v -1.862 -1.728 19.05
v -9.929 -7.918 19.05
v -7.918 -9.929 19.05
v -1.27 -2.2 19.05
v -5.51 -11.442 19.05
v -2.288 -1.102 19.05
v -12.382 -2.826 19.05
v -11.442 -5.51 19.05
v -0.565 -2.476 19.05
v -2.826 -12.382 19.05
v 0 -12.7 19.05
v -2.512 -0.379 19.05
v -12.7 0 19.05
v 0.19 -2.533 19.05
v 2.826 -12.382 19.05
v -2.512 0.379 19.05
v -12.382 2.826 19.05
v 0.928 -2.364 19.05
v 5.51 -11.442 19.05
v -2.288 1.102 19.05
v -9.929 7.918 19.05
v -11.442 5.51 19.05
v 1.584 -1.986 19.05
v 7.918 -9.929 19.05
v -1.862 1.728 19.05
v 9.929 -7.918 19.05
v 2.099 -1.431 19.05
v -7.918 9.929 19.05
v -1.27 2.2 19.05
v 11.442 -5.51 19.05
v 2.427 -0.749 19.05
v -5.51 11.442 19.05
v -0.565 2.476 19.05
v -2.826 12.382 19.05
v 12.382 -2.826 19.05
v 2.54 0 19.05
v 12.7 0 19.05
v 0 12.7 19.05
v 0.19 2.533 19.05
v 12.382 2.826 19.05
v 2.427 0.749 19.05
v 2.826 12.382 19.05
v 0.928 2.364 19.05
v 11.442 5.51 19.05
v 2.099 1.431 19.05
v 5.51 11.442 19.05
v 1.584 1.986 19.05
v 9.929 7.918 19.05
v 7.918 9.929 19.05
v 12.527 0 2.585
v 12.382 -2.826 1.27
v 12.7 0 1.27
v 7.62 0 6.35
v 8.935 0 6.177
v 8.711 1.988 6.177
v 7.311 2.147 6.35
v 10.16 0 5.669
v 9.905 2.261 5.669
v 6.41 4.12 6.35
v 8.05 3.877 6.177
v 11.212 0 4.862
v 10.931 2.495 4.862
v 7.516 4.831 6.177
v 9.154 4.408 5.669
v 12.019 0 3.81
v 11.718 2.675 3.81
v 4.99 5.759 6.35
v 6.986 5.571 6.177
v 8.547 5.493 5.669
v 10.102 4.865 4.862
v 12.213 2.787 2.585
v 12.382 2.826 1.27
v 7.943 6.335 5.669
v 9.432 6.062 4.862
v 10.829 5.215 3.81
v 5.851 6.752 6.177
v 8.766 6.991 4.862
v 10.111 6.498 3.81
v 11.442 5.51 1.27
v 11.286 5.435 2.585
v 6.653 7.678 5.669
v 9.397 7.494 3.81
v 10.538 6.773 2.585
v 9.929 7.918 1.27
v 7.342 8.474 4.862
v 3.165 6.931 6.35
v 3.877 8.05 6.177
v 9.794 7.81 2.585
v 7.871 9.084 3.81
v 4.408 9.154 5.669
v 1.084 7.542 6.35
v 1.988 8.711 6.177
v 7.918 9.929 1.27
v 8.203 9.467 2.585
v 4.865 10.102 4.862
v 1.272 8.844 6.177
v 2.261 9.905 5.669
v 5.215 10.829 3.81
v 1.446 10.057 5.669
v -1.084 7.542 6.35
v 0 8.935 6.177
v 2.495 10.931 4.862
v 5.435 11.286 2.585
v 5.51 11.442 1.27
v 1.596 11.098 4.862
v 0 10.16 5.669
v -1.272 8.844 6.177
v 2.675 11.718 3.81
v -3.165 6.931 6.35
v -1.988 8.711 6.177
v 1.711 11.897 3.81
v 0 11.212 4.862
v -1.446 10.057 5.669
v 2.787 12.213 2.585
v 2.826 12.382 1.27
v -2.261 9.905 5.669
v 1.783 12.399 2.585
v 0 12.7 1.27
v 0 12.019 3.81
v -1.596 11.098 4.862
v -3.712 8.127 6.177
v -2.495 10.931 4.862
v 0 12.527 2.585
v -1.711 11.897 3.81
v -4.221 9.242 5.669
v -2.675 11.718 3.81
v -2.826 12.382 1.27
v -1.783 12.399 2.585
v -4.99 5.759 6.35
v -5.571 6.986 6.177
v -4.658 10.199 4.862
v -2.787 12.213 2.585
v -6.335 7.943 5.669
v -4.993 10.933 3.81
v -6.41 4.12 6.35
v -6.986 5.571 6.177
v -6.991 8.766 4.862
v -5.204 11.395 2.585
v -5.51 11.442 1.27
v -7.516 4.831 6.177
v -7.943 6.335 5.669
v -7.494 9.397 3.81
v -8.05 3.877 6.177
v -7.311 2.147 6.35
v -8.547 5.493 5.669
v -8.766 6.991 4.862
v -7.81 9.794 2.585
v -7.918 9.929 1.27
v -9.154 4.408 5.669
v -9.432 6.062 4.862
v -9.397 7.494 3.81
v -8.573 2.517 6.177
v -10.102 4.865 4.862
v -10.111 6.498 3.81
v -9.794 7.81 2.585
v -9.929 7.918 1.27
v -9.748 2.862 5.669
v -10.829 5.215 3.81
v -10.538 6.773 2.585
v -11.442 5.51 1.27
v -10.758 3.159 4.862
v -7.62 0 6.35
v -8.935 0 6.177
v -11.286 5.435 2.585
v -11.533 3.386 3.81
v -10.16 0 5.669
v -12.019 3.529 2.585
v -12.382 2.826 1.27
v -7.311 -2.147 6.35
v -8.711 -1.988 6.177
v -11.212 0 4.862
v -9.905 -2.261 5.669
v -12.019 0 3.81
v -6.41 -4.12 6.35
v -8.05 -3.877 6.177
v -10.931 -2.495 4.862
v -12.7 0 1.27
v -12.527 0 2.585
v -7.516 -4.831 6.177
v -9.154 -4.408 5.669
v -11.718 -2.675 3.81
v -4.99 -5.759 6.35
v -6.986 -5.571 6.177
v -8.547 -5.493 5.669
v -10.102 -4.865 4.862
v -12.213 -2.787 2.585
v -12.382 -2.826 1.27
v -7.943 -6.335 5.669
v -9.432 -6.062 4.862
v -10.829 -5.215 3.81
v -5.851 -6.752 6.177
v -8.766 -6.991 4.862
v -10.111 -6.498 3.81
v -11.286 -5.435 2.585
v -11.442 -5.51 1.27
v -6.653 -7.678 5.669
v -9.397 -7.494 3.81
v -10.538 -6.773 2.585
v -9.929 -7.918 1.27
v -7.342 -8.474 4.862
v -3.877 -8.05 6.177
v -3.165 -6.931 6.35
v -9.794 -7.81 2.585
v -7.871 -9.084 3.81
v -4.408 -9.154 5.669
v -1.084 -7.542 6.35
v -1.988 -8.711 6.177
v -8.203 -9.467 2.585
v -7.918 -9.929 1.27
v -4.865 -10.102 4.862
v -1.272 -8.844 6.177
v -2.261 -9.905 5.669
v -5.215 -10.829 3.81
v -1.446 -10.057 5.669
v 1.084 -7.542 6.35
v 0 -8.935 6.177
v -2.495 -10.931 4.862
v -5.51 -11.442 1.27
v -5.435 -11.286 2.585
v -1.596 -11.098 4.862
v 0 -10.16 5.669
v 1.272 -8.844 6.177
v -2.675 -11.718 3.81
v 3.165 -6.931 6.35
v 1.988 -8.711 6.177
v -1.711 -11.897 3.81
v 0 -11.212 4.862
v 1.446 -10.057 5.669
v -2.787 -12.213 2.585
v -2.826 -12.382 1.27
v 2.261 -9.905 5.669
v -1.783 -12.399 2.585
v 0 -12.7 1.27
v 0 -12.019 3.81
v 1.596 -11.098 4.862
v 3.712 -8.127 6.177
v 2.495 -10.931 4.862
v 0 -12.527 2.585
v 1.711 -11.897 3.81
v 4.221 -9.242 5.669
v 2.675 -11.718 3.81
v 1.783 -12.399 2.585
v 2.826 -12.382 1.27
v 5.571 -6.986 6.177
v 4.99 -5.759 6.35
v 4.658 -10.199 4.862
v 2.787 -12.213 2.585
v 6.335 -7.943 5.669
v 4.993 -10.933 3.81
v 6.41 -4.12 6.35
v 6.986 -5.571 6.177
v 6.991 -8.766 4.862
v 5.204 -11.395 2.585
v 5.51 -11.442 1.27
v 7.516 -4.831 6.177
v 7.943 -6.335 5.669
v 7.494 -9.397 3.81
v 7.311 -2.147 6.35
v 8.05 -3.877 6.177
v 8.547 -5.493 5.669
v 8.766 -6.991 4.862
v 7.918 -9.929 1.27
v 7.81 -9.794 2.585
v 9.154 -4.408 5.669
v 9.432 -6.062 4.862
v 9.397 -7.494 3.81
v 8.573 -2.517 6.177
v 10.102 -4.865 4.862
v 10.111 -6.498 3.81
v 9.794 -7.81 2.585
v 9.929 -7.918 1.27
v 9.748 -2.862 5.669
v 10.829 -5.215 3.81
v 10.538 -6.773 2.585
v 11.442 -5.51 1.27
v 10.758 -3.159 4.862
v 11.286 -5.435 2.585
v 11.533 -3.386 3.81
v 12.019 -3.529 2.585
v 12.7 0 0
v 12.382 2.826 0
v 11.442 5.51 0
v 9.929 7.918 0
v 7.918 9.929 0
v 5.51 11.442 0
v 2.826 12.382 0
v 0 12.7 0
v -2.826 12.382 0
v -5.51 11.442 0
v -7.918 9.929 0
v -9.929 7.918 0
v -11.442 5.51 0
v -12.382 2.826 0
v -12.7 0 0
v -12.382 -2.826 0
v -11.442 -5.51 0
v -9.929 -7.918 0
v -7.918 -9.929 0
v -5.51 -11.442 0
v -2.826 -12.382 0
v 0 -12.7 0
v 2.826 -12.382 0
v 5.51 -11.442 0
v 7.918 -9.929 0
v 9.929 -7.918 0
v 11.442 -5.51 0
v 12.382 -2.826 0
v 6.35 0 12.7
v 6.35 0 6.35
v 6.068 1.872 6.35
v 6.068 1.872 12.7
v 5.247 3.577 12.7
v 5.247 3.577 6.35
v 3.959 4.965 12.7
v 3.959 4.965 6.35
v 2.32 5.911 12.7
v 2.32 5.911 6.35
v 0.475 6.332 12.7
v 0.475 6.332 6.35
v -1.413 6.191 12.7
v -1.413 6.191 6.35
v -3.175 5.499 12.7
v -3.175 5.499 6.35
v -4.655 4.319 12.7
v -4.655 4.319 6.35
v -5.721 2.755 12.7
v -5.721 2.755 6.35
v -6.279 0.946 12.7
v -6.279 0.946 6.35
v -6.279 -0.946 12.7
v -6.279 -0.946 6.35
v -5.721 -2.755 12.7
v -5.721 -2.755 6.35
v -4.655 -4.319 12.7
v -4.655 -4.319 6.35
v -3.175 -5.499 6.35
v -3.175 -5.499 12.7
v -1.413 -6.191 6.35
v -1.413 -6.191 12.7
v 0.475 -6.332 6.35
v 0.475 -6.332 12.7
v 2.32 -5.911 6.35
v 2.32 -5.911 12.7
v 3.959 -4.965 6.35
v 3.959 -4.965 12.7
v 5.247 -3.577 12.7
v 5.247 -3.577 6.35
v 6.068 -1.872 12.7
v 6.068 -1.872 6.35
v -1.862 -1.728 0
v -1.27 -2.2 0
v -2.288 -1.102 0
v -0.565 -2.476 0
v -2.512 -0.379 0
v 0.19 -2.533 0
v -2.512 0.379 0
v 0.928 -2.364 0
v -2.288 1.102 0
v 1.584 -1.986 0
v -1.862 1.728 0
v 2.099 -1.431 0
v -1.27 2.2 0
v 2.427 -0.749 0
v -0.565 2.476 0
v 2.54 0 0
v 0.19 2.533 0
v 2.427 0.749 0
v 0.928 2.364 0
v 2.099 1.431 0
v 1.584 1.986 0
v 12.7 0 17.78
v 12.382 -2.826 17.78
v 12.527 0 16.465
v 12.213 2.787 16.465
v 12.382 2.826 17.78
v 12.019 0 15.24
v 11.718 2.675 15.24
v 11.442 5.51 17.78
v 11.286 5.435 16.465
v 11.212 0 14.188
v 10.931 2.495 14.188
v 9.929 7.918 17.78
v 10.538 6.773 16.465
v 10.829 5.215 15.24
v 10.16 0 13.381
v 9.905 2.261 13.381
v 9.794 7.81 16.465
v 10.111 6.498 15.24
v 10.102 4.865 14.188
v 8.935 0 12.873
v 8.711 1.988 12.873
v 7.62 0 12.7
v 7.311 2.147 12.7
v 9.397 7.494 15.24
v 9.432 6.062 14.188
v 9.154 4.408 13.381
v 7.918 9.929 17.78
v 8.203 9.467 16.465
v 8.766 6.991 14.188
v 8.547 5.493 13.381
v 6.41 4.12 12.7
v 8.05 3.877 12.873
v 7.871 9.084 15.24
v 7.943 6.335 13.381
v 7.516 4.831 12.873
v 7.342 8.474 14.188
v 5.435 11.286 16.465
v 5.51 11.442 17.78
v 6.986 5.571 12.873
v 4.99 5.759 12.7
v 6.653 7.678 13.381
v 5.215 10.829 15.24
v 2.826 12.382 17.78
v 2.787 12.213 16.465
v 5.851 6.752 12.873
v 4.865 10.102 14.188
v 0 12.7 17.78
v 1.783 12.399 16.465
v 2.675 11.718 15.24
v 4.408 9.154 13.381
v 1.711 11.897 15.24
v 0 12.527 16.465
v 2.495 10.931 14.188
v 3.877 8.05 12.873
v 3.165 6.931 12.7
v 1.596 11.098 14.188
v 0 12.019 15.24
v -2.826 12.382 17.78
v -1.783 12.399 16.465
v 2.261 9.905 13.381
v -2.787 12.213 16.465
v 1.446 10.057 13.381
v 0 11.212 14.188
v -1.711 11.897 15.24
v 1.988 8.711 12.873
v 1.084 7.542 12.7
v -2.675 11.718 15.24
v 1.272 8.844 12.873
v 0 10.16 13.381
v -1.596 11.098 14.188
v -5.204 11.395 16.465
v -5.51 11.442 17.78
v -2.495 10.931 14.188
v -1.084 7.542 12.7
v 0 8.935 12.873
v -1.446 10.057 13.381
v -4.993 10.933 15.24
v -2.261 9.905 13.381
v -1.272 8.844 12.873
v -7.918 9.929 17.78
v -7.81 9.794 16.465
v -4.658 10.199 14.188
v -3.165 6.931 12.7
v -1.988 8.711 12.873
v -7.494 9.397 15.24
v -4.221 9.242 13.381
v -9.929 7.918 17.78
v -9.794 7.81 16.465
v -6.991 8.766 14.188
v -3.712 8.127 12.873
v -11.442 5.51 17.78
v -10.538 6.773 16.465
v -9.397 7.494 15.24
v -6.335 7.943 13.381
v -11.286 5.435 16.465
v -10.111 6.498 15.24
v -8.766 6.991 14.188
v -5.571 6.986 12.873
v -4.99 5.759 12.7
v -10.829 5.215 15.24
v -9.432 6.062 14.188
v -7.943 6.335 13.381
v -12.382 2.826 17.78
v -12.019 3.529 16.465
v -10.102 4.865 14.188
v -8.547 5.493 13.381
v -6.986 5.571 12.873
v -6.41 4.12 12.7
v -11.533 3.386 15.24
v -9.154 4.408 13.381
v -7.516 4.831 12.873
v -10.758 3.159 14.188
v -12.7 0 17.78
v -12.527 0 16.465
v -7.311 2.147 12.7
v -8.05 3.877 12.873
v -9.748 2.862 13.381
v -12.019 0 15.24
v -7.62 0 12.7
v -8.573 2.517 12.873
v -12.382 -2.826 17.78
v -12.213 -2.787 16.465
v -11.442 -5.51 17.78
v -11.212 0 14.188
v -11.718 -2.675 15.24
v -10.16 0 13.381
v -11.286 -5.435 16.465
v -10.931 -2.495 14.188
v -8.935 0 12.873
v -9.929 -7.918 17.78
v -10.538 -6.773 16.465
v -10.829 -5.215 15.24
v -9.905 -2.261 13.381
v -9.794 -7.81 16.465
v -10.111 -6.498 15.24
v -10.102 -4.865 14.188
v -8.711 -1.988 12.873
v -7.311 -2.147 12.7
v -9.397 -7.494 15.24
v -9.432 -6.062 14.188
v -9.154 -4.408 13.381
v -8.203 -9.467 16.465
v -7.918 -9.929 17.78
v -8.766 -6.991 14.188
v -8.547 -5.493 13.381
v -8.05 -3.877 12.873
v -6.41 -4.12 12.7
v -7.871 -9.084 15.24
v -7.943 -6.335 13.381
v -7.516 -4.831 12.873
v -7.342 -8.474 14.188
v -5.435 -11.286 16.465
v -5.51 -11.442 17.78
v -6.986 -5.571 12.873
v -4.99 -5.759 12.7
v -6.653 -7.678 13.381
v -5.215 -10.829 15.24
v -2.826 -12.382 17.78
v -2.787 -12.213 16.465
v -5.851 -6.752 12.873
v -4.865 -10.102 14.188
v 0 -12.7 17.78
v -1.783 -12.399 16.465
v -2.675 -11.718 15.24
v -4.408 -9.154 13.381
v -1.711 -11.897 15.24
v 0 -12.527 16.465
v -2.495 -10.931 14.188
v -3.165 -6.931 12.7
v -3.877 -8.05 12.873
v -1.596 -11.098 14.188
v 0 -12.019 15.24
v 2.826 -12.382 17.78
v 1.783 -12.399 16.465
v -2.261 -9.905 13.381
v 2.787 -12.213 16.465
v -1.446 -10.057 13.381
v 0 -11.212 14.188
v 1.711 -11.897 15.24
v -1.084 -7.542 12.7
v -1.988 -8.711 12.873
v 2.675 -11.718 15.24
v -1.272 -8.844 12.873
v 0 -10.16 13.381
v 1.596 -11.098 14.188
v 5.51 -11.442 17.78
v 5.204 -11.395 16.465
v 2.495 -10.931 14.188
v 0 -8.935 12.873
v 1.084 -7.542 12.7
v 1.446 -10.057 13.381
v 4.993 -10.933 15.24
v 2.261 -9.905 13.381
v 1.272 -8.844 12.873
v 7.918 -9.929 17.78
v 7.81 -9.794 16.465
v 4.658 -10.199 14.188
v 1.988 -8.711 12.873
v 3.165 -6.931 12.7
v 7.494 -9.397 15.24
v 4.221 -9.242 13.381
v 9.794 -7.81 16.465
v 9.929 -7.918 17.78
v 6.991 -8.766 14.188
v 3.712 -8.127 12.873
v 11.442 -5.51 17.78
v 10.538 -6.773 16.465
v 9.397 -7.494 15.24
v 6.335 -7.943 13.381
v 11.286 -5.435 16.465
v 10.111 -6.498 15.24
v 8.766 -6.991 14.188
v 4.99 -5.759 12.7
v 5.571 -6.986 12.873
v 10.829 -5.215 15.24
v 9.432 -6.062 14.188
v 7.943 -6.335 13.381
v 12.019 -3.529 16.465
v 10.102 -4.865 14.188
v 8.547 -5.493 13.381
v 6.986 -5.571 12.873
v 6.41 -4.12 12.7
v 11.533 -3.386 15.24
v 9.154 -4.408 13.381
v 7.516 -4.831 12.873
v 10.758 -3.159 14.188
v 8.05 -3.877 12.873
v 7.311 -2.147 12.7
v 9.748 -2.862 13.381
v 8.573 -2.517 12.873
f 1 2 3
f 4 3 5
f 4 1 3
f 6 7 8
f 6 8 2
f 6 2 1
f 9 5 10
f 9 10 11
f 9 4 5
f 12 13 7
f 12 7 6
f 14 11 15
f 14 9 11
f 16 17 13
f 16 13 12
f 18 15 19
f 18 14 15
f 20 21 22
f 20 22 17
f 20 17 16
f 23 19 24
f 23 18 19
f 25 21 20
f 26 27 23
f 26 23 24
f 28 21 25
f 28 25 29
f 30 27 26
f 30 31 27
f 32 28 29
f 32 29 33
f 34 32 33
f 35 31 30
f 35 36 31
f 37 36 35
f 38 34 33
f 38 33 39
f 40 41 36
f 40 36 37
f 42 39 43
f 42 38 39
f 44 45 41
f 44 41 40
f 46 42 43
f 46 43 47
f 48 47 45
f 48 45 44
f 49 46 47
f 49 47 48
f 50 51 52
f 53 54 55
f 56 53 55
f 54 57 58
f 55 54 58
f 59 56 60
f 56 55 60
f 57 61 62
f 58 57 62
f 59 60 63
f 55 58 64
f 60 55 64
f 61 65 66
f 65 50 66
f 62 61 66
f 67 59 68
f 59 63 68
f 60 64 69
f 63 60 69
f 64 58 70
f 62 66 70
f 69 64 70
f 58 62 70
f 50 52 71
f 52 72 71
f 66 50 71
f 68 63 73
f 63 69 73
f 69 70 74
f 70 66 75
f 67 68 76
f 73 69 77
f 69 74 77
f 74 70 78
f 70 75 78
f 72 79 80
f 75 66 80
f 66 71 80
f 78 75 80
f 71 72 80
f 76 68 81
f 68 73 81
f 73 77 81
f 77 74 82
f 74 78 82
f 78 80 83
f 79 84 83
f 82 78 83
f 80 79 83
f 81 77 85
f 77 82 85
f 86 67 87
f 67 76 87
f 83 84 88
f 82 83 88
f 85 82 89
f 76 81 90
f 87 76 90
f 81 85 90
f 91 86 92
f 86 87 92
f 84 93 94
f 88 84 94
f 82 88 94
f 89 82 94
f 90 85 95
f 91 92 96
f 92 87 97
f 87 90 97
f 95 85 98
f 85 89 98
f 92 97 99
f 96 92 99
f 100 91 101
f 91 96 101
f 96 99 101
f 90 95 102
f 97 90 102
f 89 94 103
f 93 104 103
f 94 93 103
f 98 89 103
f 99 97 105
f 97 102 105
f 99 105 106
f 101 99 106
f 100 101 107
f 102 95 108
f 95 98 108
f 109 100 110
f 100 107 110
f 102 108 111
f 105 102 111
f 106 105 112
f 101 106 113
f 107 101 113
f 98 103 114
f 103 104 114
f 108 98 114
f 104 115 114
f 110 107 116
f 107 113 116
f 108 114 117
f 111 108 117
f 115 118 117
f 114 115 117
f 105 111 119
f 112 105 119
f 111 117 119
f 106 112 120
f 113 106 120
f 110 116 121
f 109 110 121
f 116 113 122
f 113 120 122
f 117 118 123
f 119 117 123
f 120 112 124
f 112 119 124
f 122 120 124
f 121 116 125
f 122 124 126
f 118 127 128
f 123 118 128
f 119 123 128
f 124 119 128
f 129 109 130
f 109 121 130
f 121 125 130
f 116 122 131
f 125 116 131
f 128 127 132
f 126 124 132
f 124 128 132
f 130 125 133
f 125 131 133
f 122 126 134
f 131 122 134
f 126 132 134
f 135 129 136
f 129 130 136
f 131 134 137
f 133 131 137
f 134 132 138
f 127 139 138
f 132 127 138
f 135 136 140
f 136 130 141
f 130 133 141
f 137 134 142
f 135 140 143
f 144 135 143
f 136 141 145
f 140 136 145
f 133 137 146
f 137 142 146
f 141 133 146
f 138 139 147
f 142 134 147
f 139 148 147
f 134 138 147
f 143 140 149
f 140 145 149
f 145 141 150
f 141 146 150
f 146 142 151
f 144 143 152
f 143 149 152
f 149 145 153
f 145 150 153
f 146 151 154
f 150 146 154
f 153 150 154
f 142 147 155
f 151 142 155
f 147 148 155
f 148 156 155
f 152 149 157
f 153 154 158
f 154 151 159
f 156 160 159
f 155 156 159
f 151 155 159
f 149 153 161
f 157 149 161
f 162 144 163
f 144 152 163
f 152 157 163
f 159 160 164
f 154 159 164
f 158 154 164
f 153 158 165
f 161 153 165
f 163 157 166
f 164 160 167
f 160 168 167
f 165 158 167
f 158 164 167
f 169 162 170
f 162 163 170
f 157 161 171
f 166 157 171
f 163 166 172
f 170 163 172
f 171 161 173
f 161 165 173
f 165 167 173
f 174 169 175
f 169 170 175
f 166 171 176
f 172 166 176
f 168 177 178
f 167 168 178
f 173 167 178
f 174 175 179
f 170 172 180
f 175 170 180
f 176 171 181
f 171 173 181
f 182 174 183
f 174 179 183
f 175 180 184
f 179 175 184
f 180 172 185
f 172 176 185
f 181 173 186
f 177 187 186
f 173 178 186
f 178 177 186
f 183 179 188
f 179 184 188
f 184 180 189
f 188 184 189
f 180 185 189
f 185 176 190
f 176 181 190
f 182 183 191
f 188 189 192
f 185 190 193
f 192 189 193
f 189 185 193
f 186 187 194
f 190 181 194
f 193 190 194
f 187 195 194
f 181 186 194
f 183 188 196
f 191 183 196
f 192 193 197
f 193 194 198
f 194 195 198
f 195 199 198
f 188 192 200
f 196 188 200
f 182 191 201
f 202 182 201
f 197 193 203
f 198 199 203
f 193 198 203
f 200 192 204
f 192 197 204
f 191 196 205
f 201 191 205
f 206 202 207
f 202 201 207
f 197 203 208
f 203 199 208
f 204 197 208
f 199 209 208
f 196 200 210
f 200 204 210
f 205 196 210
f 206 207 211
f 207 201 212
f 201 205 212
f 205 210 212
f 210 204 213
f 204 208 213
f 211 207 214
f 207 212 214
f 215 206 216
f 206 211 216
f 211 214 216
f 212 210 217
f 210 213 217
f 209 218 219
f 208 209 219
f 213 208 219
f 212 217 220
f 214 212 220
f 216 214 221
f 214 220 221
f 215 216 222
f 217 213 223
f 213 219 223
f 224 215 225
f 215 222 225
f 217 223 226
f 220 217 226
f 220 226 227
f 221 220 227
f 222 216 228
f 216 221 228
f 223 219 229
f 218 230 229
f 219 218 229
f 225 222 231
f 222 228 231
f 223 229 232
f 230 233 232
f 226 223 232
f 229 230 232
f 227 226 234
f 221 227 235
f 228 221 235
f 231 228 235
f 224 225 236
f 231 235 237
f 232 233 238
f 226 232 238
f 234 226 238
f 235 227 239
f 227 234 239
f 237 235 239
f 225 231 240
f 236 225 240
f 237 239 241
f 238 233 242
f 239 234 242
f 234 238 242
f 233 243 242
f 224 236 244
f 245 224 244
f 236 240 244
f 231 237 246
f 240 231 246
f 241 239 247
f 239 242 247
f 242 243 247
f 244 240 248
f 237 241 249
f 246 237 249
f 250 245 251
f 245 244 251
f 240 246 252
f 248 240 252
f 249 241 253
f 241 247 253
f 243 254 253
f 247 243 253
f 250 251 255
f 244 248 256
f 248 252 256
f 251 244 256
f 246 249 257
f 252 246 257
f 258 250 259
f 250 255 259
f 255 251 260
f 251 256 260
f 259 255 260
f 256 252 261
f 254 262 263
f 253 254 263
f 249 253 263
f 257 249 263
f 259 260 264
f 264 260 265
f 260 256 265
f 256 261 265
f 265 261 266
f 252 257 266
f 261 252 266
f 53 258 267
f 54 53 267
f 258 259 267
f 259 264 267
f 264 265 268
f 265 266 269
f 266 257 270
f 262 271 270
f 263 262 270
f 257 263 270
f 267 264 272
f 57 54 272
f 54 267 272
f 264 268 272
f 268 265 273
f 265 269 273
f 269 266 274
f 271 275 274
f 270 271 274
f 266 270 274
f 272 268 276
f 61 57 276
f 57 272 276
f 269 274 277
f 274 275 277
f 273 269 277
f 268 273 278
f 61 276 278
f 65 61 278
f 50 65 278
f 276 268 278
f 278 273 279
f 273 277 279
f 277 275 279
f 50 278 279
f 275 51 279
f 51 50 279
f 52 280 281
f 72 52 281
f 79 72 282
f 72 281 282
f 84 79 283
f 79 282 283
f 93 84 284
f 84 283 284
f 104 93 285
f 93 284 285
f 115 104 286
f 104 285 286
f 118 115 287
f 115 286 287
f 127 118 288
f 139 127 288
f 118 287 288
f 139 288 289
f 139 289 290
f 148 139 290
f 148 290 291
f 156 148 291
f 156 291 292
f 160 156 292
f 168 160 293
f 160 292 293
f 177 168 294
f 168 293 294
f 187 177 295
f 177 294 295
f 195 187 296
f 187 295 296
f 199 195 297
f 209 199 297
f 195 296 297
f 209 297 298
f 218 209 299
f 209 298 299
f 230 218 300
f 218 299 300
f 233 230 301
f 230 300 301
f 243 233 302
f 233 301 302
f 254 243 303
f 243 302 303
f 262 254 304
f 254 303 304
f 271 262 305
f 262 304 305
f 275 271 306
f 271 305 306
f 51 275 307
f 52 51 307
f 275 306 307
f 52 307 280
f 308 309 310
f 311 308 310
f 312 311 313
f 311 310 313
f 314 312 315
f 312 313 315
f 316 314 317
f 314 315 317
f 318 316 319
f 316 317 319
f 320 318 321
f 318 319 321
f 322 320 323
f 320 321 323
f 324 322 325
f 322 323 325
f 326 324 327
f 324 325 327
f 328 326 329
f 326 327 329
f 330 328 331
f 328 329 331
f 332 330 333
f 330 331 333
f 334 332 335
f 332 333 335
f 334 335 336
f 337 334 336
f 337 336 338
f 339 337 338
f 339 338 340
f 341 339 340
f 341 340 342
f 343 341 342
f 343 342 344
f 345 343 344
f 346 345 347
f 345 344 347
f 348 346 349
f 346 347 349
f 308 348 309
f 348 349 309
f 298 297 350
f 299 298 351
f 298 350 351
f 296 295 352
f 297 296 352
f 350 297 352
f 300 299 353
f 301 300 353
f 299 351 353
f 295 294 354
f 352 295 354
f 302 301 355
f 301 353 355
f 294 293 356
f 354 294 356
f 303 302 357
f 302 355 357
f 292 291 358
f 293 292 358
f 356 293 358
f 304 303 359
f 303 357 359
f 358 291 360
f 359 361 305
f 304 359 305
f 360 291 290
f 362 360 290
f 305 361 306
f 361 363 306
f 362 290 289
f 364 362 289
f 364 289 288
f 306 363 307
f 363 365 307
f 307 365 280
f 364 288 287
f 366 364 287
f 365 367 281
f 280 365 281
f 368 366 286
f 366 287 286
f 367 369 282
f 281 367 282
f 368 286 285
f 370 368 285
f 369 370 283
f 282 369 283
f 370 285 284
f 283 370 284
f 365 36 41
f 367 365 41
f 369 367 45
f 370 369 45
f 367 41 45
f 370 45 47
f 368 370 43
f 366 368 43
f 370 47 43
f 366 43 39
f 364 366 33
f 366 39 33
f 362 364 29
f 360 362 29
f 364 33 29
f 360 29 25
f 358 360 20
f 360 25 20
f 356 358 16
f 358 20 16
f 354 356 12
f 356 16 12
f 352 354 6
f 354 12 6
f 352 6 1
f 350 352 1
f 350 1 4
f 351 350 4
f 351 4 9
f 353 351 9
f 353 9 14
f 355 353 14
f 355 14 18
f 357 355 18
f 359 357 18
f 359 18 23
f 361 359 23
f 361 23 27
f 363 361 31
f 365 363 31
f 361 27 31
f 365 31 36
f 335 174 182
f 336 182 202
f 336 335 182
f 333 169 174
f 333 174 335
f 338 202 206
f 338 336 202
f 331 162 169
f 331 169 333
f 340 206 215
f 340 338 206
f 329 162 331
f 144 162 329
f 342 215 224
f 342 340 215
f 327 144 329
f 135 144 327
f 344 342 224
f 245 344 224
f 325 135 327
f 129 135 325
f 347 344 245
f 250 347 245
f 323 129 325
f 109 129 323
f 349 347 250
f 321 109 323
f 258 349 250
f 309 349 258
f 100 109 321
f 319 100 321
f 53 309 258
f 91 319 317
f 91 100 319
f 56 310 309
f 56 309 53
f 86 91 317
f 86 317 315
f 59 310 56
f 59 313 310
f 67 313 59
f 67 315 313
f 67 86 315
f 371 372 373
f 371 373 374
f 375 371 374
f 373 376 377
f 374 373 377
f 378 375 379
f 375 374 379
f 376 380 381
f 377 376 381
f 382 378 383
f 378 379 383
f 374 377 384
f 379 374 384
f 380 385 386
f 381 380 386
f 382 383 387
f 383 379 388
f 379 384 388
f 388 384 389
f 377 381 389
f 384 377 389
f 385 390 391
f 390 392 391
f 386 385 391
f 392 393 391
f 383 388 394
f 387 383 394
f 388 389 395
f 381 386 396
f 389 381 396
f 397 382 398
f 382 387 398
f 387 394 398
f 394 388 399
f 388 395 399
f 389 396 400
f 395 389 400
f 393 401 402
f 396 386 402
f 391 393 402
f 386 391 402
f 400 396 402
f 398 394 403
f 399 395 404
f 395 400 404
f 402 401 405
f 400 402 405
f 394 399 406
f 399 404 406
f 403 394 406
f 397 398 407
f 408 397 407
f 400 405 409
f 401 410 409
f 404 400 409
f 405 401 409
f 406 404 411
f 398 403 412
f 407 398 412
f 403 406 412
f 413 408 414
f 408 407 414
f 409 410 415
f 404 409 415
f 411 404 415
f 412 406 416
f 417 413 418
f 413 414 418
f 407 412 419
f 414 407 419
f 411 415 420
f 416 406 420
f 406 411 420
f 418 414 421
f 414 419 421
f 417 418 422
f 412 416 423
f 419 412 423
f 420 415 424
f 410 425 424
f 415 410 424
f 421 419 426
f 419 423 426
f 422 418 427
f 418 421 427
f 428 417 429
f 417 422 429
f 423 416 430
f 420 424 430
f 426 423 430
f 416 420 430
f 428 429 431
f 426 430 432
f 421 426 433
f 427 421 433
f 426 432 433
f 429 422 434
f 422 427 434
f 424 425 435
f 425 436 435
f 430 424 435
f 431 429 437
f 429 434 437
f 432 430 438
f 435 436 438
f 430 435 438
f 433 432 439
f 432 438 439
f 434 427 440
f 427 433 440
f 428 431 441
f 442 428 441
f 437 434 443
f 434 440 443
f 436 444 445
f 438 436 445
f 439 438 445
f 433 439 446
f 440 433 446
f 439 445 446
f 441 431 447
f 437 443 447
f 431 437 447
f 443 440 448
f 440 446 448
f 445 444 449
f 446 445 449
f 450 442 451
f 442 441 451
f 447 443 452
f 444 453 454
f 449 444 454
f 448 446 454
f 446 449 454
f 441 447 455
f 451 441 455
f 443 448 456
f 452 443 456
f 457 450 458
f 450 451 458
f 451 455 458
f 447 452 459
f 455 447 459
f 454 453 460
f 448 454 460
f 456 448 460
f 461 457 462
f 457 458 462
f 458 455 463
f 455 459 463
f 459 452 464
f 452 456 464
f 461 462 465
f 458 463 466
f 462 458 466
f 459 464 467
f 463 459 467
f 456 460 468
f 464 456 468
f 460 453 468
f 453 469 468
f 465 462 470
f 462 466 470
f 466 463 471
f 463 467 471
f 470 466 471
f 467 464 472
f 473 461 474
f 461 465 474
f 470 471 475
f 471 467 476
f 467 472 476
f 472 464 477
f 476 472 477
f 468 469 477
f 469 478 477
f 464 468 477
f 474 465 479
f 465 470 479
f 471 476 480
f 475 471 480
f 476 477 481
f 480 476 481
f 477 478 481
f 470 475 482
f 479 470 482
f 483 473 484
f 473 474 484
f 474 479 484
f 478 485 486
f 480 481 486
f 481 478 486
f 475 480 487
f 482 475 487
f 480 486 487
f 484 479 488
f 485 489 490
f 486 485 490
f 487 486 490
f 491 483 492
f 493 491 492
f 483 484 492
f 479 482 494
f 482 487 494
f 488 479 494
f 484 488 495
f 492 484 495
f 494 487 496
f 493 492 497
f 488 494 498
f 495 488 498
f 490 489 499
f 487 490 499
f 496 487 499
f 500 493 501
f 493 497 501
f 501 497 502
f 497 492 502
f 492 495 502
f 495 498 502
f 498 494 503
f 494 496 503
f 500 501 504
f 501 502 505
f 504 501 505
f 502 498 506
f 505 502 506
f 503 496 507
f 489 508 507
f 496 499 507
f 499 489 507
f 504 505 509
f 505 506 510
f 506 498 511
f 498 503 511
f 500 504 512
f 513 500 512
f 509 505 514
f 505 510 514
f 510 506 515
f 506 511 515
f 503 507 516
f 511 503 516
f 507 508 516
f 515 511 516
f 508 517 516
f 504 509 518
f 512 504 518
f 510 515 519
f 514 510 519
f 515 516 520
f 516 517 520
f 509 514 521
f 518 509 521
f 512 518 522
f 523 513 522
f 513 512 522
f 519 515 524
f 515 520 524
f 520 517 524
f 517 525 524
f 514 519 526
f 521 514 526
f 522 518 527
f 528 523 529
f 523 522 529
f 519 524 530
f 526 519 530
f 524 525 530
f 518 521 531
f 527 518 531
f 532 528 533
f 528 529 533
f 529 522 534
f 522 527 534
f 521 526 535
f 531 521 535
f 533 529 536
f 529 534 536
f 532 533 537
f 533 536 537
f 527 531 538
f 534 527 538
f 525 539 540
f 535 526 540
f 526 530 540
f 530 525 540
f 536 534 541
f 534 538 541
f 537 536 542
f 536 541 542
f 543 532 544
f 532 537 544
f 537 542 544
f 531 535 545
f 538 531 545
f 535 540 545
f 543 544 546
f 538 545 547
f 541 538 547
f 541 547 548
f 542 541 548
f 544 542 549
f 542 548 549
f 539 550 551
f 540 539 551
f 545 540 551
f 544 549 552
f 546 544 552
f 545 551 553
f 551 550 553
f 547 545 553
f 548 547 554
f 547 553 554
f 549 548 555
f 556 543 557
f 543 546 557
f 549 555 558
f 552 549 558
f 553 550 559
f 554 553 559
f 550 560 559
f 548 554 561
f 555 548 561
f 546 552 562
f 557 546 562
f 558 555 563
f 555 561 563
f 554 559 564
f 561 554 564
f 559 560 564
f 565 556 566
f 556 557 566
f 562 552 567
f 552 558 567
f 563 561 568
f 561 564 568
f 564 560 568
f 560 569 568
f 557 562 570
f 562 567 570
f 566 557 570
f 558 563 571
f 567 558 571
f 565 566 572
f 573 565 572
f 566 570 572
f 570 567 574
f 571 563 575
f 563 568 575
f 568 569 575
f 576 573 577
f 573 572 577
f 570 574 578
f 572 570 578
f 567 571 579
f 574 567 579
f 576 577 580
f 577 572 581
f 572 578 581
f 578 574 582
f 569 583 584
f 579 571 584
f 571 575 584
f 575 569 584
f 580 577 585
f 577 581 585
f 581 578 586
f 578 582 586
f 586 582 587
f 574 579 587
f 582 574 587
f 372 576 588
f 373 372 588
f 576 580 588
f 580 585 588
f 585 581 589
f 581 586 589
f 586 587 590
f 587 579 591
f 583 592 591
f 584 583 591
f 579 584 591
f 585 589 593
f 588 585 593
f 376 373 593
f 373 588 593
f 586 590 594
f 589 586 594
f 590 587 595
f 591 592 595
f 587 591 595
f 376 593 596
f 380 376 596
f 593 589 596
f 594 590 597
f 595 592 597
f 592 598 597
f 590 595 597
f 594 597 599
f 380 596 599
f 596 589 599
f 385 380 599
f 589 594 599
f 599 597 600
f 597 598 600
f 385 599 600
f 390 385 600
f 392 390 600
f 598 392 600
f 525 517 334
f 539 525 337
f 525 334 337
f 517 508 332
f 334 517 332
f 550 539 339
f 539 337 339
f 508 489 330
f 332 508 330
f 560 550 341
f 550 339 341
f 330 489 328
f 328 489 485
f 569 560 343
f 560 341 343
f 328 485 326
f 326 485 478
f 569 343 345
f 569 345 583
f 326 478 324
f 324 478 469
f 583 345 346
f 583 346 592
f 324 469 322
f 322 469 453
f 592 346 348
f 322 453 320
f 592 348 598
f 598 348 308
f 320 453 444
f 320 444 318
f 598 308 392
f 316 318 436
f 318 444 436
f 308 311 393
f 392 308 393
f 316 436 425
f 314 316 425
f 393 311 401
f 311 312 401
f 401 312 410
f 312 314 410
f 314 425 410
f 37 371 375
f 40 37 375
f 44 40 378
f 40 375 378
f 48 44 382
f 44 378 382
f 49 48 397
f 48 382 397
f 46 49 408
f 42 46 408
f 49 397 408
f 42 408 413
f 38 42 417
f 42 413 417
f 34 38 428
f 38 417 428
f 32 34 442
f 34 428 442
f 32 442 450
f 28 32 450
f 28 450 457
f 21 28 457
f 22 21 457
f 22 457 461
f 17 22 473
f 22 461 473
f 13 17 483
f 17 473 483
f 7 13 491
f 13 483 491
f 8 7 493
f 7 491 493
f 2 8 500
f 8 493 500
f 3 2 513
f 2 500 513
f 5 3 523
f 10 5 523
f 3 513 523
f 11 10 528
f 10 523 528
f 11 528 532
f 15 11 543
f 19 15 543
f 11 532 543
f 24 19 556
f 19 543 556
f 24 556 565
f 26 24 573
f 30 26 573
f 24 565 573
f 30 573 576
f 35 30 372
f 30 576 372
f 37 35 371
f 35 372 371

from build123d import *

# Parameters (mm, degrees)
F0_R     = 12.7
F1_DEPTH = 6.35
F2_R     = 6.35
F3_DEPTH = 6.35
F4_R     = 12.7
F4_R_2   = 6.35
F5_DEPTH = 6.35
F6_R     = 2.54
F7_DEPTH = 19.05
F8_R     = 5.08


with BuildPart() as f1:
    # F0 (on Top) → F1 (new body)
    with BuildSketch(Plane.XY):
        Circle(F0_R)
    extrude(amount=F1_DEPTH)

    # F2 (on face) → F3 (join)
    with BuildSketch(Plane.XY.offset(6.35)):
        Circle(F2_R)
    extrude(amount=F3_DEPTH)

    # F4 (on face) → F5 (join)
    with BuildSketch(Plane.XY.offset(12.7)):
        Circle(F4_R)
        Circle(F4_R_2, mode=Mode.SUBTRACT)
        Circle(F4_R_2)
    extrude(amount=F5_DEPTH)

    # F6 (on face) → F7 (cut)
    with BuildSketch(Plane.XY.offset(19.05)):
        Circle(F6_R)
    extrude(amount=-F7_DEPTH, mode=Mode.SUBTRACT)

    # F8
    f8_edges = [f1.edges().sort_by_distance(p)[0] for p in [
        (-12.7, 0, 12.7),
        (-12.7, 0, 6.35),
    ]]
    fillet(f8_edges, radius=F8_R)


solid = f1.part
